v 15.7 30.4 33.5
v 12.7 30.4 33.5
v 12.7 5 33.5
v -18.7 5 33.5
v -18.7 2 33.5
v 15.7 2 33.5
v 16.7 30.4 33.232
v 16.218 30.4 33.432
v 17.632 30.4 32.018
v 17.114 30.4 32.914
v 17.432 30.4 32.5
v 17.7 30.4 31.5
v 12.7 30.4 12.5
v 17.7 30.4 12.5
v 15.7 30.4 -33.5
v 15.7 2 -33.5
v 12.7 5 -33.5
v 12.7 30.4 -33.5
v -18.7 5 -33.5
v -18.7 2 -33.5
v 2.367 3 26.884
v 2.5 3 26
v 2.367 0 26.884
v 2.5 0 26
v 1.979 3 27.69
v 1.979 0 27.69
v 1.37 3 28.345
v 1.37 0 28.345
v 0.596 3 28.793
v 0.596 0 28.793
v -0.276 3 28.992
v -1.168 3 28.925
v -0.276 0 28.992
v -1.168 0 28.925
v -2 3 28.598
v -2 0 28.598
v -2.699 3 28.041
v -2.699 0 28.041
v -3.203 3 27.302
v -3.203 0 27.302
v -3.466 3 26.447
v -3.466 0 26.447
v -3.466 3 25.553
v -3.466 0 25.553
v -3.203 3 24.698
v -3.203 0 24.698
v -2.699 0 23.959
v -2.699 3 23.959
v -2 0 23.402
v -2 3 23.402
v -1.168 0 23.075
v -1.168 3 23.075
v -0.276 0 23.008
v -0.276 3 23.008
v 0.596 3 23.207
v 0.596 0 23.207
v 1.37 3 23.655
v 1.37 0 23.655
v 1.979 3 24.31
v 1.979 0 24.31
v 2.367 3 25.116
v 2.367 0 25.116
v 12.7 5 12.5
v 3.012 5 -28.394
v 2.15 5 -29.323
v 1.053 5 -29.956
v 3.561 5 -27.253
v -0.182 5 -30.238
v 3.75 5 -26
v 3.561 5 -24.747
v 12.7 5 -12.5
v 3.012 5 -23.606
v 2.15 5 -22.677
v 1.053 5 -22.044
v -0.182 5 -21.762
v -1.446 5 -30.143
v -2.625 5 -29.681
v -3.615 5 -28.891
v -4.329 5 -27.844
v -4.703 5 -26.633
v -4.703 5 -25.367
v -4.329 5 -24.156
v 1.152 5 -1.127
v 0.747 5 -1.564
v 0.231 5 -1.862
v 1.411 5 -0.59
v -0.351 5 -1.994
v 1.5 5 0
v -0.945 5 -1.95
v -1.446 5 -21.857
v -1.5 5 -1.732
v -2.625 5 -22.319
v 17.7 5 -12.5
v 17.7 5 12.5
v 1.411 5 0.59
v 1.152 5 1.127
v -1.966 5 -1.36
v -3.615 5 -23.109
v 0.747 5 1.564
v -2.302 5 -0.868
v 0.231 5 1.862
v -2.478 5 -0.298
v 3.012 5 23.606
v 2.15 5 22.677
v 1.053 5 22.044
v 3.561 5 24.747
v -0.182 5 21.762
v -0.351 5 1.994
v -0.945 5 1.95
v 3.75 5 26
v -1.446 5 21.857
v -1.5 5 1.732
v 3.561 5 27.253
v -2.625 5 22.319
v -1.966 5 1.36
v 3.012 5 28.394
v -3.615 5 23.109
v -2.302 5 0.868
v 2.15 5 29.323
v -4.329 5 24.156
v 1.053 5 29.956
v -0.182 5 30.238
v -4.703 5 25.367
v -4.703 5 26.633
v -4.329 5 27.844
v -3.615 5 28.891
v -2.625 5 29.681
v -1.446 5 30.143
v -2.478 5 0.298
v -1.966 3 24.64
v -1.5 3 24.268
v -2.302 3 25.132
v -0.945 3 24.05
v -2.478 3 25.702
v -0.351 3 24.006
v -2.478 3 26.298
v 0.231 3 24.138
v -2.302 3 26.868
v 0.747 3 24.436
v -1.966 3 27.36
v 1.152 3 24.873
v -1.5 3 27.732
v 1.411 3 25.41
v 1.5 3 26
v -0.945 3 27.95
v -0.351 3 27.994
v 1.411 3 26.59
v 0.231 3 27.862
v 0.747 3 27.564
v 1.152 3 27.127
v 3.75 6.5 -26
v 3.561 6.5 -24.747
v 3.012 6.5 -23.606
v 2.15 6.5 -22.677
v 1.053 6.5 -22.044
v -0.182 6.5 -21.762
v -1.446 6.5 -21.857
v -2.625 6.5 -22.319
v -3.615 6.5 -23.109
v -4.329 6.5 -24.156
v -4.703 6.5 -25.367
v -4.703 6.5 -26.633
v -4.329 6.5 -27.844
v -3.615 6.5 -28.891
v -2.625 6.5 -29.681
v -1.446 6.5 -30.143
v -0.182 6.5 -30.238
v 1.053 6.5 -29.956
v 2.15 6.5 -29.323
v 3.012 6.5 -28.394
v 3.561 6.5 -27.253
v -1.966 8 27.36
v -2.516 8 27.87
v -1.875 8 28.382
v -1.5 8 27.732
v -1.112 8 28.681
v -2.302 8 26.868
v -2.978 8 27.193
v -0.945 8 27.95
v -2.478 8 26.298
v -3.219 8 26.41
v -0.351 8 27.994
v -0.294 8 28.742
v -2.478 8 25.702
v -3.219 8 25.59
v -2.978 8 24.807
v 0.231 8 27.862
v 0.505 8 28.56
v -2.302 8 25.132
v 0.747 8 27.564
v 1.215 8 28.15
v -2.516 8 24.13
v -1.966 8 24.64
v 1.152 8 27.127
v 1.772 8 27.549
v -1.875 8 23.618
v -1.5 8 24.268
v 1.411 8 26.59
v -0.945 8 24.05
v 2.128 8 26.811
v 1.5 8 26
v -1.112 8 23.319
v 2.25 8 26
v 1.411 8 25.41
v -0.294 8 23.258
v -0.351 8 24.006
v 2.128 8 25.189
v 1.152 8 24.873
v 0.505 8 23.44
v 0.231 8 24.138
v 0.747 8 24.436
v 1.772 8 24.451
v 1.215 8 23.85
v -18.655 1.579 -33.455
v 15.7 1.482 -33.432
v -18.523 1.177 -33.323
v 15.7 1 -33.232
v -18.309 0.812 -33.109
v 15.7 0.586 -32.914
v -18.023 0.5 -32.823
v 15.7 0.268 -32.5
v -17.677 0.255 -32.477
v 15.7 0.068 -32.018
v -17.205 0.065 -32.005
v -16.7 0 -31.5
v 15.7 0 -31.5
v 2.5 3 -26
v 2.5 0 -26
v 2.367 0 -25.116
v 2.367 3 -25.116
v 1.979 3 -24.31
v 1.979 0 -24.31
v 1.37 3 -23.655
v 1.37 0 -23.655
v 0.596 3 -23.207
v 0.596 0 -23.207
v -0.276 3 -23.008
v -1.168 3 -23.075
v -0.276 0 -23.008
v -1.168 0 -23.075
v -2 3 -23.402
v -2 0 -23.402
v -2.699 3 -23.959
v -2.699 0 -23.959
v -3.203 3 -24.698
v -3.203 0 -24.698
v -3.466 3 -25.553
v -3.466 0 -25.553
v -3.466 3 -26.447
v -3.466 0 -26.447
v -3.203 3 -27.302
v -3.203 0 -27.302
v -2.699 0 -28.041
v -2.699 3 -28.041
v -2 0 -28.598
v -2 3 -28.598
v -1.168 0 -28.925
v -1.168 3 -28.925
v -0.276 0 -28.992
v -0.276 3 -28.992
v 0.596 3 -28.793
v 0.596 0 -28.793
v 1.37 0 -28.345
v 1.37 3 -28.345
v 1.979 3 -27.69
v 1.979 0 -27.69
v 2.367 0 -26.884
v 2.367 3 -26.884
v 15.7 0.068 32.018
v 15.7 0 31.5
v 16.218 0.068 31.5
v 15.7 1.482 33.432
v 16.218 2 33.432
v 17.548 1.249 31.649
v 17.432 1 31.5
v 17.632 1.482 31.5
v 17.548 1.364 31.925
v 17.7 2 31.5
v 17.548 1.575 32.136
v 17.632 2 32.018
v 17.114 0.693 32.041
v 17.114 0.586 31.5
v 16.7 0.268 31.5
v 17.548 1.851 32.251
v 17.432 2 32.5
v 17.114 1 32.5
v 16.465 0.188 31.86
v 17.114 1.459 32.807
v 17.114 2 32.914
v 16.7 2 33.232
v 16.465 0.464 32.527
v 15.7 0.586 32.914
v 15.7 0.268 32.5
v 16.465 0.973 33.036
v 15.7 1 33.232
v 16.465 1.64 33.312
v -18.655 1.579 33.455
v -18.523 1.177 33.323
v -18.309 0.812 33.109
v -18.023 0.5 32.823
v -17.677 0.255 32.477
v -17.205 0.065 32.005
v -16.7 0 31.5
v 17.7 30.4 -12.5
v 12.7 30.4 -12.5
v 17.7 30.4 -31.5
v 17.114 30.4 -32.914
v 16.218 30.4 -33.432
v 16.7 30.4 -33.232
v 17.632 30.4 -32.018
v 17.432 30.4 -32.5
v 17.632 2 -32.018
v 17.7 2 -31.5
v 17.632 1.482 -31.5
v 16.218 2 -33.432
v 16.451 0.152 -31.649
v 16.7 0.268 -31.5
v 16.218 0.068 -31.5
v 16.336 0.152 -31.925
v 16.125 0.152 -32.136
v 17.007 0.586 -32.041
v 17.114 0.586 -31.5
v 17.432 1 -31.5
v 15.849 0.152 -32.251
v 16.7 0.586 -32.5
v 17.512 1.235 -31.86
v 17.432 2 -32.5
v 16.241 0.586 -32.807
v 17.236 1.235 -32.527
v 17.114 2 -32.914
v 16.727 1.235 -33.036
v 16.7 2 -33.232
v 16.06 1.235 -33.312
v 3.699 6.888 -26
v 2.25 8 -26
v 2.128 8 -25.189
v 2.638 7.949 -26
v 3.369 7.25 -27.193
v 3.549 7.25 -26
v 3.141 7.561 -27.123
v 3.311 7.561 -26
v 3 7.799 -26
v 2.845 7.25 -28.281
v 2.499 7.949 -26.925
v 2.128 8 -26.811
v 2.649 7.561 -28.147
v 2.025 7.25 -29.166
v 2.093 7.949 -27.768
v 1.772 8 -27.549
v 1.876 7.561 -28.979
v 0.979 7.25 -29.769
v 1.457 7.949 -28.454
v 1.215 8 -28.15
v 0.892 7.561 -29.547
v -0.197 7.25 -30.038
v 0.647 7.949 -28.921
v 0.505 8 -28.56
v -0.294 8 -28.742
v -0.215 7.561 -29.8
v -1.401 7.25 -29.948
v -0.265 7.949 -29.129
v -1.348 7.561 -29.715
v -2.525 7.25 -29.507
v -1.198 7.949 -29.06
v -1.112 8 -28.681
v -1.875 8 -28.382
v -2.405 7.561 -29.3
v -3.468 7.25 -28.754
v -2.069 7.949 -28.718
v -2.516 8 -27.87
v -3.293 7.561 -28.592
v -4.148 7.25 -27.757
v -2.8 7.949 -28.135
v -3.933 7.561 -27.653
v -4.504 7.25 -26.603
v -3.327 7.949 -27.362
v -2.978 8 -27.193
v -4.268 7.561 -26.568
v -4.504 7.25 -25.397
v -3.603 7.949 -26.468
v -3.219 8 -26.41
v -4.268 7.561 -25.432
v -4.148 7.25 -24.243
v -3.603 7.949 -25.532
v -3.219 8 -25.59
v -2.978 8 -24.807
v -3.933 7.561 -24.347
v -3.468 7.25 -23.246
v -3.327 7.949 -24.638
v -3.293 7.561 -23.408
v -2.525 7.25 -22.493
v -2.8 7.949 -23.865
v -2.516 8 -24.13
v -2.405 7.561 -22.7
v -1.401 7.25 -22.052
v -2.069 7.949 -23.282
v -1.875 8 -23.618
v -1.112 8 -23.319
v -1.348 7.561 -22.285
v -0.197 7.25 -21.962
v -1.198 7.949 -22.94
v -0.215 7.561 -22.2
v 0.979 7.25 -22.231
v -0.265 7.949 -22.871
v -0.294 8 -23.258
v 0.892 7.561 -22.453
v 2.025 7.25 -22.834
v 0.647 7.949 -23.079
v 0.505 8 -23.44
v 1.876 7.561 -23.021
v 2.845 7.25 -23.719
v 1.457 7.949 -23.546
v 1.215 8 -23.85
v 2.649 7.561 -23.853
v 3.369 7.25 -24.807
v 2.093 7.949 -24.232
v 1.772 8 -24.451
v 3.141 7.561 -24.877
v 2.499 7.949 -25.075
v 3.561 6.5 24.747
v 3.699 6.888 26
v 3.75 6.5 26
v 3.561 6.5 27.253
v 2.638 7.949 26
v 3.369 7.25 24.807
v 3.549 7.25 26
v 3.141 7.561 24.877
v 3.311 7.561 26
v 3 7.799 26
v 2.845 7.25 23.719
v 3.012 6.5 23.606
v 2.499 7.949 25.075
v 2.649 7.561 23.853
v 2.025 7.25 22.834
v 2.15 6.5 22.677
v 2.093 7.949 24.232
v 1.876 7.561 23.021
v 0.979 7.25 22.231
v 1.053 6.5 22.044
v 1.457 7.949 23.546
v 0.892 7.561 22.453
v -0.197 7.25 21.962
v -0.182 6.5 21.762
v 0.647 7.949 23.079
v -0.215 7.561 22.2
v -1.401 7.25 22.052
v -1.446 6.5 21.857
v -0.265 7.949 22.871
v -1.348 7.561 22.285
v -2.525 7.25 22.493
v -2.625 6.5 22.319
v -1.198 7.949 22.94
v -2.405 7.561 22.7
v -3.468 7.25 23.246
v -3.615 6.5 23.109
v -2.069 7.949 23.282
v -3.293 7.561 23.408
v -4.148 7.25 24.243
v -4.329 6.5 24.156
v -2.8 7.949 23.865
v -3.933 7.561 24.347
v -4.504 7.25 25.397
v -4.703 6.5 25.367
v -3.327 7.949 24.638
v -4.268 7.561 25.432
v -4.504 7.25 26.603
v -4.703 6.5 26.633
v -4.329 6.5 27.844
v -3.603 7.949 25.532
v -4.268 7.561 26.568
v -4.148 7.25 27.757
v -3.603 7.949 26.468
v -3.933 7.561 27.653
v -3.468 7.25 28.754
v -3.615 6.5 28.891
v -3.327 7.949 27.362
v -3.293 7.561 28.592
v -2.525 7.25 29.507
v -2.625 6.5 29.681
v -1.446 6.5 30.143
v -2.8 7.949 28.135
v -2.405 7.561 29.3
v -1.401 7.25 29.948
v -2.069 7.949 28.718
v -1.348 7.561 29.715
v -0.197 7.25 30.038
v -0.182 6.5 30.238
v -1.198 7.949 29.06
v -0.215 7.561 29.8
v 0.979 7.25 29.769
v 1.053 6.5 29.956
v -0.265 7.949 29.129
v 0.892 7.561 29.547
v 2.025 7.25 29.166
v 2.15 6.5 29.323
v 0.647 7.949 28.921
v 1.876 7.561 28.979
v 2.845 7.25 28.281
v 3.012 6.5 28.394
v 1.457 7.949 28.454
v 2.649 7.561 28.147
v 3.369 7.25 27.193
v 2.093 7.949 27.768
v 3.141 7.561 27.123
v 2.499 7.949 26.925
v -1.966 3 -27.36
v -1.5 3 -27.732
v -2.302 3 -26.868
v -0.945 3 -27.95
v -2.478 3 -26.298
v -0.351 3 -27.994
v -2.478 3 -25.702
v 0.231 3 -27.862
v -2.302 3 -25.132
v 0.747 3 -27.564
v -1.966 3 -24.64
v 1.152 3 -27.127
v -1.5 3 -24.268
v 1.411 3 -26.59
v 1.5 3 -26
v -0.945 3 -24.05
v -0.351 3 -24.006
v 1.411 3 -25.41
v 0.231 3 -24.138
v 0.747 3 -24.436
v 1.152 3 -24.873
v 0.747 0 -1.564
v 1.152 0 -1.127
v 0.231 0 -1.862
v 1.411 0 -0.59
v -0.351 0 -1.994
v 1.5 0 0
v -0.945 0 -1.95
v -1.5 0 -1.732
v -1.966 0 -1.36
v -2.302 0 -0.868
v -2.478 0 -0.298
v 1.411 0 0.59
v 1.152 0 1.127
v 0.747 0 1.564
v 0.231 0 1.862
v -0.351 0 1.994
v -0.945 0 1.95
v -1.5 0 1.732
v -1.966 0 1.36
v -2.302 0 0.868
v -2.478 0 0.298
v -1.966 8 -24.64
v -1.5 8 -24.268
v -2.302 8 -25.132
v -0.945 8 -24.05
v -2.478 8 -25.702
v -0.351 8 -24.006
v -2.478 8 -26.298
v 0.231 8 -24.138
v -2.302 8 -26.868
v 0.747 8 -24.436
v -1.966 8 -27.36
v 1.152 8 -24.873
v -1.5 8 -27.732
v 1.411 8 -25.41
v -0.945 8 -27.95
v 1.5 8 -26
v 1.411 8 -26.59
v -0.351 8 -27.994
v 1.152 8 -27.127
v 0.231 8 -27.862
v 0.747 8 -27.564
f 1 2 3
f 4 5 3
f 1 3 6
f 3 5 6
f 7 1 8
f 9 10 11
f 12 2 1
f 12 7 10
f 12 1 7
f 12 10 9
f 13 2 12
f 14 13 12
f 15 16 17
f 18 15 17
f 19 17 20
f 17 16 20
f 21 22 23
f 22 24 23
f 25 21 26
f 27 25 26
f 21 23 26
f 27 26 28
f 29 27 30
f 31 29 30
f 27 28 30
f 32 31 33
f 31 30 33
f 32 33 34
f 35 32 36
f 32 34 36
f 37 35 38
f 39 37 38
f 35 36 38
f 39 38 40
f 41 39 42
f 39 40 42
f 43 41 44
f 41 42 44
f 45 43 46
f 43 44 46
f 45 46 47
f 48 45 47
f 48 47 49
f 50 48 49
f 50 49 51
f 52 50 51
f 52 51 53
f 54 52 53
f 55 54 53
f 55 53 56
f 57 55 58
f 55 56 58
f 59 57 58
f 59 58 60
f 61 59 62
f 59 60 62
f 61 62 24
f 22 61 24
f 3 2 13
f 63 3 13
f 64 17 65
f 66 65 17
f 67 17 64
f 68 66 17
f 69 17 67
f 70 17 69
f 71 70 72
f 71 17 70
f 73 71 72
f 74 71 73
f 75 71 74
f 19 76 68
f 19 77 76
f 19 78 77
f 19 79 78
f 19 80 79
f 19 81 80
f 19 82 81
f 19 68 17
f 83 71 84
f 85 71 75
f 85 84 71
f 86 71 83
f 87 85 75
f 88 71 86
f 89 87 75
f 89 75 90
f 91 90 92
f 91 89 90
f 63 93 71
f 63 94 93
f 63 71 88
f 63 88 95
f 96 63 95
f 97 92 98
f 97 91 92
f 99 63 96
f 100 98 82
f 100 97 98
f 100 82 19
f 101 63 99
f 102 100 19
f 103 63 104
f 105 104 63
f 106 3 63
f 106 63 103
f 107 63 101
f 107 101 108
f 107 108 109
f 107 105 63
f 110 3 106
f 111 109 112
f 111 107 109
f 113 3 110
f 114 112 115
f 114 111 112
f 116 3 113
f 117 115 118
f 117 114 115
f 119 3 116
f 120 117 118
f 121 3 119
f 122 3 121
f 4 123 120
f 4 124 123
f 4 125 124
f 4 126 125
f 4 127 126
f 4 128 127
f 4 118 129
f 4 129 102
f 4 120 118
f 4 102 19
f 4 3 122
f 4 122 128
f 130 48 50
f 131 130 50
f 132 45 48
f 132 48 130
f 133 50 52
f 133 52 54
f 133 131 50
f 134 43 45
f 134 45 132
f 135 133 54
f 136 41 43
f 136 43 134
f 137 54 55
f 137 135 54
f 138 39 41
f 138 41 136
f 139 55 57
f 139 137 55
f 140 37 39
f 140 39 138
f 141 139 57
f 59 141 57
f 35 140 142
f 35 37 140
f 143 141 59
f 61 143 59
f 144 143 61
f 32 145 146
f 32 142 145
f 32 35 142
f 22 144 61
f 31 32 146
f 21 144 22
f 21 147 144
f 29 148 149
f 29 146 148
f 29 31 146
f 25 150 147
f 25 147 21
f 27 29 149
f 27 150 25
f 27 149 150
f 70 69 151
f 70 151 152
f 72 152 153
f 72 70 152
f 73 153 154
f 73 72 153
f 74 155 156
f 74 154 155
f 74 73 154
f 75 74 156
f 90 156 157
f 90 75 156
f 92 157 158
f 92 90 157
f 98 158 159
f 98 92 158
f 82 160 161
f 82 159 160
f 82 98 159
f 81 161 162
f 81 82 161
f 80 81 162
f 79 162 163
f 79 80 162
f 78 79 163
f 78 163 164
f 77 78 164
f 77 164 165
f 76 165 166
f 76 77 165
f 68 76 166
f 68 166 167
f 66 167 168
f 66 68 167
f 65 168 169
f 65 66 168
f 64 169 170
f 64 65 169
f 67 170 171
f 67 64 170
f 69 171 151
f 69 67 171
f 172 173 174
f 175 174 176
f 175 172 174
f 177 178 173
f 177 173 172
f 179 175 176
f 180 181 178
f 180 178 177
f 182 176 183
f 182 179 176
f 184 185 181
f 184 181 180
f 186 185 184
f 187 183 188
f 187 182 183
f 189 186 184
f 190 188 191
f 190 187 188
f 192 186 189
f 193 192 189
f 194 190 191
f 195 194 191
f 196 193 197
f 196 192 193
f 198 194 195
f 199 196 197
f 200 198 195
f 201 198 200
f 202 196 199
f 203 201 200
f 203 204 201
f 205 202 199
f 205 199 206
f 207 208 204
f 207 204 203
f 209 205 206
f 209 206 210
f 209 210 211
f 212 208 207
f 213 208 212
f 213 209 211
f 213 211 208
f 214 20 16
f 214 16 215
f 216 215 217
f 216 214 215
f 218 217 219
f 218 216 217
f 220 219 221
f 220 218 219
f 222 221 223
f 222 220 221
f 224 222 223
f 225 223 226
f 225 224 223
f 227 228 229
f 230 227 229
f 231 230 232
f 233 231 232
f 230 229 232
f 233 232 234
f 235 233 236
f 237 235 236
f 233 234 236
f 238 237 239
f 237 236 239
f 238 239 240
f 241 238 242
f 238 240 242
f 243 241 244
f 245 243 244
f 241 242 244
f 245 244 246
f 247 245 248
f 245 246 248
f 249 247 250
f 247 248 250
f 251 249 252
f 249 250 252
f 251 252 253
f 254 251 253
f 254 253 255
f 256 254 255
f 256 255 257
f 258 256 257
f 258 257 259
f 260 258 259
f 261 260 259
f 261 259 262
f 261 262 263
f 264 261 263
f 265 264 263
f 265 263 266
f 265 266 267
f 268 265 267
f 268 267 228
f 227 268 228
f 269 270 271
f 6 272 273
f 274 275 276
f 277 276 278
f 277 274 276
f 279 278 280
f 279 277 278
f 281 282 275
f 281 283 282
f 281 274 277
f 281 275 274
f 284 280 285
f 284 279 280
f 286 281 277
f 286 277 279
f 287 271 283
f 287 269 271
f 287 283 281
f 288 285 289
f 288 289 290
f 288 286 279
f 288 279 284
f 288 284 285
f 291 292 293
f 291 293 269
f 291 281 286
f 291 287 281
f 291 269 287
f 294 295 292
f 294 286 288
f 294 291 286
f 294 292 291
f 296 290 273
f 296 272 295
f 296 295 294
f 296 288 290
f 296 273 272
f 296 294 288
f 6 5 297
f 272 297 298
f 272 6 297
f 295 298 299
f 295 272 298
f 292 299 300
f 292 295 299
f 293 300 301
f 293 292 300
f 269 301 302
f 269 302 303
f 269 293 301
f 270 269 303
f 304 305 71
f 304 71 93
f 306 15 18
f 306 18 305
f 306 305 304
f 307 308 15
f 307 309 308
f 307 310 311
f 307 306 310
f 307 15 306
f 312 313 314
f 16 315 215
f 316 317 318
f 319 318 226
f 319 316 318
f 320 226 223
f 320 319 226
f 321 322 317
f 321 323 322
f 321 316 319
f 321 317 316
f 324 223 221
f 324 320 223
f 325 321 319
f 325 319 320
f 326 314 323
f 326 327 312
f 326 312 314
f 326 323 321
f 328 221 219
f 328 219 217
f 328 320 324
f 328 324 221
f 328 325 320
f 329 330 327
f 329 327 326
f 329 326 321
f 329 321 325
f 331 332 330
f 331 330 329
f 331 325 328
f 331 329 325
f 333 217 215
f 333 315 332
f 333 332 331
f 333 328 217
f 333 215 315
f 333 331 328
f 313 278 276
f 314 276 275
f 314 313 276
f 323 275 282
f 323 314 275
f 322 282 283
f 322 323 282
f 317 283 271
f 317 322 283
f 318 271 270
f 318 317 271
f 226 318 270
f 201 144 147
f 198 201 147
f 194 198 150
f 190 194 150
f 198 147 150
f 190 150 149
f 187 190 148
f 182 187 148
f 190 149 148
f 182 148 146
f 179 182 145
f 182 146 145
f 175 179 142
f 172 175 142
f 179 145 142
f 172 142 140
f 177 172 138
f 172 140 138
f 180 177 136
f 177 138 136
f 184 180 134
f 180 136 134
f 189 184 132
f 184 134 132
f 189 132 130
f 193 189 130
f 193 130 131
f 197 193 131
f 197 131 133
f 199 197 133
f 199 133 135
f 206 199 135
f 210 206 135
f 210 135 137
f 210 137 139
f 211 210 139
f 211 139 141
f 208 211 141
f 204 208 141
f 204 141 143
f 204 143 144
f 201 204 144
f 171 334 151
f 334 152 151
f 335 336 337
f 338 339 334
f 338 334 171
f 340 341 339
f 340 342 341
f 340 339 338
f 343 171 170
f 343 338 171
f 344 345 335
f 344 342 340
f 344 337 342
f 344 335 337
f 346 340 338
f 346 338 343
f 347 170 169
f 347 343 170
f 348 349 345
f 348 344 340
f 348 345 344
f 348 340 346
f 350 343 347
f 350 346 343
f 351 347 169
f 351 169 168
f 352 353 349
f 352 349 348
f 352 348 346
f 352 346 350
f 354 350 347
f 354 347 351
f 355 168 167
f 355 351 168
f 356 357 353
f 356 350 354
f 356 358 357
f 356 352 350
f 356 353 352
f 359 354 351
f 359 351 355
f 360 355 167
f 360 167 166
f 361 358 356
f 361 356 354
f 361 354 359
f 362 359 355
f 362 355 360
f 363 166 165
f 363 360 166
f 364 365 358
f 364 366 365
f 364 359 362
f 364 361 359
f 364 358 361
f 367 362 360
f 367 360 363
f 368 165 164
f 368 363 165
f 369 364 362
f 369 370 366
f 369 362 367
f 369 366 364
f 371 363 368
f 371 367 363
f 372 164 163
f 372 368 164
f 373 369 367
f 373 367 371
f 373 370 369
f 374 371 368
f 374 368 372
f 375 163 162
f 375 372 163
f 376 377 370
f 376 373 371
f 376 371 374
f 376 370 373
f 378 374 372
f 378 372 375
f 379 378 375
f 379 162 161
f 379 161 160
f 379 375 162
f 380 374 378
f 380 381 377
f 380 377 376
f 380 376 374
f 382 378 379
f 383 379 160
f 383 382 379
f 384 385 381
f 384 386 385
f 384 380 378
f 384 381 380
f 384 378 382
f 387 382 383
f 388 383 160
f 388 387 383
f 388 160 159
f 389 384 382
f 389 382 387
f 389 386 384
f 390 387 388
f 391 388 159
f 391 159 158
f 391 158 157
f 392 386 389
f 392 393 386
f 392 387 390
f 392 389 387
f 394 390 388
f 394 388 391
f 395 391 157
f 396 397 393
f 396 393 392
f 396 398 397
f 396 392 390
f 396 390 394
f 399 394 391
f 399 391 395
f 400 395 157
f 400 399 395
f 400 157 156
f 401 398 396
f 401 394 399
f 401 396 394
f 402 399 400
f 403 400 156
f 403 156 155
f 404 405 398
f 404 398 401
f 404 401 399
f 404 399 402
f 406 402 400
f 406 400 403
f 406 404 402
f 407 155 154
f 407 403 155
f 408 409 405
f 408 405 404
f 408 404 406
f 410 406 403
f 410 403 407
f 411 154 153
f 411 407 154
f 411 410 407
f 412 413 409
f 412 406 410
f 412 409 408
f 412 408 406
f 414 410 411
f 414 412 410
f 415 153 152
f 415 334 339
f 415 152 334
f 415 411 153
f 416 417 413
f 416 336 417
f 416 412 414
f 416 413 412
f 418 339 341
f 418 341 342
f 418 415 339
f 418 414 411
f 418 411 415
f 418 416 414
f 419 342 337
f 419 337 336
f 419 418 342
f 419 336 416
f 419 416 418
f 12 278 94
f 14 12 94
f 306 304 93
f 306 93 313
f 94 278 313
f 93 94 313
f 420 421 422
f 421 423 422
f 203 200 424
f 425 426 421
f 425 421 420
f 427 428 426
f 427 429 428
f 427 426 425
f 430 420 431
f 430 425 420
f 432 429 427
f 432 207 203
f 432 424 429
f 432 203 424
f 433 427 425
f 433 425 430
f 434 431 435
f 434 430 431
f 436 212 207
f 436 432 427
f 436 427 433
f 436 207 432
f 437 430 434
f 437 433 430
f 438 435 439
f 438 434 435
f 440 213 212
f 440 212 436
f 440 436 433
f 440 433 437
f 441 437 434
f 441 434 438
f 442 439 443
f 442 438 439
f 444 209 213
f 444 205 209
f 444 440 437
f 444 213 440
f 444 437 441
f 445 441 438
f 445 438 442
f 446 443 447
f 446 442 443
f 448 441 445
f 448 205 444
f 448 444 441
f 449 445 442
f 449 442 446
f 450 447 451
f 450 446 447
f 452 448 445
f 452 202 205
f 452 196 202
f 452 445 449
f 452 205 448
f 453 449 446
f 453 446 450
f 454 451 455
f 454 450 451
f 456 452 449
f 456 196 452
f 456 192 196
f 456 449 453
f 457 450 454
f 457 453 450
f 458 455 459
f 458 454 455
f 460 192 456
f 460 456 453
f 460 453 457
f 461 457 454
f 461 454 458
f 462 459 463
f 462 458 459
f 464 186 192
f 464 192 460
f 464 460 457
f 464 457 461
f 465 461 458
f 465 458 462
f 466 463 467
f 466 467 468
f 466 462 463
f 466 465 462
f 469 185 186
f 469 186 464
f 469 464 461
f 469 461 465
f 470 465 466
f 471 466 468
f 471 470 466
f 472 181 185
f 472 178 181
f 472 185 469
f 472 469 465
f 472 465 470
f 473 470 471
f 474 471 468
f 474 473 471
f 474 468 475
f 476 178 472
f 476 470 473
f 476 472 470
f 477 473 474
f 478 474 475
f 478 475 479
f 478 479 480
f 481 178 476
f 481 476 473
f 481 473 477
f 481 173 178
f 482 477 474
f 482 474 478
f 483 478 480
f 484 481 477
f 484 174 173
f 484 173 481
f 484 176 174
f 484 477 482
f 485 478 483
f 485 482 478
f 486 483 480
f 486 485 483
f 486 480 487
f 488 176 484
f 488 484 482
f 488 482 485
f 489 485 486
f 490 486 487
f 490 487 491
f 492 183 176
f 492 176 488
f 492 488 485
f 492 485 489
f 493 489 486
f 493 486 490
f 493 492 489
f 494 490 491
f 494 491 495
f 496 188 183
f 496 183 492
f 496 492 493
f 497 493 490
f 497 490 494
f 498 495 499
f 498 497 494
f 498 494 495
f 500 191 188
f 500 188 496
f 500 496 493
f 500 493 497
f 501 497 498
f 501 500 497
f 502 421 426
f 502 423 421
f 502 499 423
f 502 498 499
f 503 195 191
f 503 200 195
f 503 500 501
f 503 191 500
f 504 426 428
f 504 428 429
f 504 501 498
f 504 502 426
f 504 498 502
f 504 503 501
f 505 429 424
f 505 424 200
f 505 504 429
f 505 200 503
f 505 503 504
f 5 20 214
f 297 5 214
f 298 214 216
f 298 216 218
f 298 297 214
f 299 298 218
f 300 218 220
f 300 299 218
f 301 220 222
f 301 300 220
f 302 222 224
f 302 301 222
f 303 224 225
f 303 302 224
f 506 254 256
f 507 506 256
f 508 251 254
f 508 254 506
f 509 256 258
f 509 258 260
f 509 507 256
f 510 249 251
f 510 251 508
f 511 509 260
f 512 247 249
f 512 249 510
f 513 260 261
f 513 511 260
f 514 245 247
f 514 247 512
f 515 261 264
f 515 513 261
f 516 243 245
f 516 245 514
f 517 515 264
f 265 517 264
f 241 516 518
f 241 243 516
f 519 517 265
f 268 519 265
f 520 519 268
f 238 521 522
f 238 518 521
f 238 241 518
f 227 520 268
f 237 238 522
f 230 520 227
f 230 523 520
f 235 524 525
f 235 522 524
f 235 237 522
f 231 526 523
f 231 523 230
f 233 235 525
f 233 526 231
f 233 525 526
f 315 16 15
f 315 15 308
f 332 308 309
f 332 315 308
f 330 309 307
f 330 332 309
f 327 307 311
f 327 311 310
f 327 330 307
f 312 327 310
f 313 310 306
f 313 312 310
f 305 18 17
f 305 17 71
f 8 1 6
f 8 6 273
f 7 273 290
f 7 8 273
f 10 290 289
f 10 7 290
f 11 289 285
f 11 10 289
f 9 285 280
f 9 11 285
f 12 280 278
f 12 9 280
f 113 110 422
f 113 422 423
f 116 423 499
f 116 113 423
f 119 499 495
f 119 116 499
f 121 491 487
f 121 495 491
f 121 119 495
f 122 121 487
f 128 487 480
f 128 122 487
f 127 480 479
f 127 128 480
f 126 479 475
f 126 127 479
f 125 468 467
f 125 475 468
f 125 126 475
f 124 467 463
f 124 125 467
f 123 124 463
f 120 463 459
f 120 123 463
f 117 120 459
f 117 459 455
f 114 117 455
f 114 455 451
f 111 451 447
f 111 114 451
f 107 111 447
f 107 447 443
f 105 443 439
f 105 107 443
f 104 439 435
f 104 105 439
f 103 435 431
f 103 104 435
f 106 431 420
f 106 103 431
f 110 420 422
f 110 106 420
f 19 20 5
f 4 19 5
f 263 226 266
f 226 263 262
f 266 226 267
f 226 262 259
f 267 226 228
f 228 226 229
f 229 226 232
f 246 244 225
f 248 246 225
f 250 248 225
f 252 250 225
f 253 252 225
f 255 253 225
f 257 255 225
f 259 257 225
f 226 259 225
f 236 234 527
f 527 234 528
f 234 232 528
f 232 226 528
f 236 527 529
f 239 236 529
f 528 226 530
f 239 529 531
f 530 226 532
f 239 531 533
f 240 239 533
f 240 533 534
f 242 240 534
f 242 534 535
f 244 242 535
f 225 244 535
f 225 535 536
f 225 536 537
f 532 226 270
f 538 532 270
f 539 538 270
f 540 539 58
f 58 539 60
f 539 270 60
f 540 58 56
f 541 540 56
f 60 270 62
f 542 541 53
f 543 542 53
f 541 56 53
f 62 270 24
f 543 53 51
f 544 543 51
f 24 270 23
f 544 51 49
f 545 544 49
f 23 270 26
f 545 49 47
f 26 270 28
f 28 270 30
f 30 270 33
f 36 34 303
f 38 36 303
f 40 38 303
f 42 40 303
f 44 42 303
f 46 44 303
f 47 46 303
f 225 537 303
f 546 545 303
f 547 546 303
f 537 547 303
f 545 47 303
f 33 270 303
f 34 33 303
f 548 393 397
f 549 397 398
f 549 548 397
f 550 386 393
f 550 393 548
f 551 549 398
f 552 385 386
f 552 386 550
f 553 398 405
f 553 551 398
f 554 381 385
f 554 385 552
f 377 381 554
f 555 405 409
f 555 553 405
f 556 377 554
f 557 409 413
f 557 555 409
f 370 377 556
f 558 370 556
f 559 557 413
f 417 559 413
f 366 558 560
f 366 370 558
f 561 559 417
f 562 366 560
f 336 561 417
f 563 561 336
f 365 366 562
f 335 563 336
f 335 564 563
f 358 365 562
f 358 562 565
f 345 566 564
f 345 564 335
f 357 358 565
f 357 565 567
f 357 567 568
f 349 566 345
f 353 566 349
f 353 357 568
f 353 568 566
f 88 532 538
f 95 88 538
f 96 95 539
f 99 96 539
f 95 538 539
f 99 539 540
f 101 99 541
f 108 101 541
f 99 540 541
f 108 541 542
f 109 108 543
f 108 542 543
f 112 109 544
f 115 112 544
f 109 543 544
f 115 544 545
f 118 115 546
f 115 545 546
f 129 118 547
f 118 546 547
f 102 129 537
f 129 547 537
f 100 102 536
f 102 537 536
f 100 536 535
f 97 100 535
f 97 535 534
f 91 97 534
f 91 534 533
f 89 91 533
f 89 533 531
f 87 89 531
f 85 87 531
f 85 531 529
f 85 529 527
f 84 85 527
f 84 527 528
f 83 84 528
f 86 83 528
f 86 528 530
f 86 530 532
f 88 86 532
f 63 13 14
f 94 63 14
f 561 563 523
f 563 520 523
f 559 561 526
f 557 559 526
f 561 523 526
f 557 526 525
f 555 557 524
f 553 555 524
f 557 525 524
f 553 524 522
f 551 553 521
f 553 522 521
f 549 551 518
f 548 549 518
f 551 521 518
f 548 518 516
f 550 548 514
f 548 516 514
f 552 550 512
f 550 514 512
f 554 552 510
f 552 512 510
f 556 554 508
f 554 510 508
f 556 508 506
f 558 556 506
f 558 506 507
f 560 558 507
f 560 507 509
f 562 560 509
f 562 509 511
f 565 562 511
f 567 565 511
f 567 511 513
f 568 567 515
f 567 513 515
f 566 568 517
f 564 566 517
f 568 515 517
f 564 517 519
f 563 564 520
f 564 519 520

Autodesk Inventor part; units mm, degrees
ref_plane "YZ Plane" through (0, 0, 0) normal (1, 0, 0) x (0, 1, 0)
ref_plane "XZ Plane" through (0, 0, 0) normal (0, 1, 0) x (-1, 0, 0)
ref_plane "XY Plane" through (0, 0, 0) normal (0, 0, 1) x (1, 0, 0)
sketch "Sketch1" plane through (0, 0, 0) normal (0, 1, 0) x (-1, 0, 0)
  line L0 (18.7, 33.5) -> (-17.7, 33.5)
  line L1 (-17.7, 33.5) -> (-17.7, -33.5)
  line L2 (-17.7, -33.5) -> (18.7, -33.5)
  line L3 (18.7, -33.5) -> (18.7, 33.5)
  point P0 (0, 0)
  dimension "d0" = 36.4
  dimension "d1" = 67
extrude "Extrusion1" add sketch "Sketch1" along normal blind 5
sketch "Sketch2" plane through (0, 5, 0) normal (0, 1, 0) x (1, 0, 0)
  line L0 (-18.7, -33.5) -> (17.7, -33.5) projected
  line L1 (17.7, -33.5) -> (12.7, -33.5)
  line L2 (12.7, -33.5) -> (12.7, -12.5)
  line L3 (12.7, -12.5) -> (17.7, -12.5)
  line L4 (17.7, -12.5) -> (17.7, -33.5)
  line L5 (17.7, -33.5) -> (17.7, 33.5) projected
  line L6 (17.7, 33.5) -> (12.7, 33.5)
  line L7 (12.7, 33.5) -> (12.7, 12.5)
  line L8 (12.7, 12.5) -> (17.7, 12.5)
  line L9 (17.7, 12.5) -> (17.7, 33.5)
  point P0 (0, 0)
  dimension "d4" = 5
  dimension "d5" = 21
  dimension "d6" = 5
  dimension "d7" = 21
extrude "Extrusion2" add sketch "Sketch2" along normal blind 25.4
sketch "Sketch3" plane through (0, 5, 0) normal (0, 1, 0) x (1, 0, 0)
  circle A0 centre (-0.5, -26) radius 4.25
  circle A1 centre (0, 0) radius 4.25
  circle A2 centre (-0.5, 26) radius 4.25
  line L0 (-18.7, 33.5) -> (-18.7, -33.5) projected
  dimension "d10" = 8.5
  dimension "d11" = 8.5
  dimension "d12" = 8.5
  dimension "d26" = 18.2
  dimension "d27" = 18.2
extrude "Extrusion3" add sketch "Sketch3" along normal blind 3 contours A0 | A2
sketch "Sketch4" plane through (0, 0, 0) normal (0, -1, 0) x (1, 0, 0)
  circle A0 centre (-0.5, -26) radius 4.25 projected
  circle A1 centre (-0.5, -26) radius 3
  circle A2 centre (-0.5, 26) radius 4.25 projected
  circle A3 centre (-0.5, 26) radius 3
  point P0 (0, 0)
  dimension "d15" = 6
  dimension "d16" = 6
extrude "Extrusion4" cut sketch "Sketch4" against normal blind 3 contours A1 | A3
sketch "Sketch5" plane through (0, 0, 0) normal (0, -1, 0) x (1, 0, 0)
  circle A0 centre (-0.5, -26) radius 3 projected
  circle A1 centre (-0.5, -26) radius 2
  circle A2 centre (-0.5, 26) radius 4.25 projected
  circle A3 centre (-0.5, 26) radius 2
  circle A4 centre (-0.5, 0) radius 2
  point P0 (0, 0)
  dimension "d19" = 4
  dimension "d21" = 4
  dimension "d30" = 4
extrude "Extrusion5" cut sketch "Sketch5" against normal blind 15 contours A1 | A3 | A4
fillet "Fillet1" radius 1.5 2 edges at (-4.75, 8, 26) (-4.75, 8, -26)
fillet "Fillet2" radius 2 6 edges at (-0.5, 0, 33.5) (-18.7, 0, 0) (17.7, 15.2, 33.5) (17.7, 15.2, -33.5) (-0.5, 0, -33.5) (17.7, 0, 0)
properties part number "springBedMount"
